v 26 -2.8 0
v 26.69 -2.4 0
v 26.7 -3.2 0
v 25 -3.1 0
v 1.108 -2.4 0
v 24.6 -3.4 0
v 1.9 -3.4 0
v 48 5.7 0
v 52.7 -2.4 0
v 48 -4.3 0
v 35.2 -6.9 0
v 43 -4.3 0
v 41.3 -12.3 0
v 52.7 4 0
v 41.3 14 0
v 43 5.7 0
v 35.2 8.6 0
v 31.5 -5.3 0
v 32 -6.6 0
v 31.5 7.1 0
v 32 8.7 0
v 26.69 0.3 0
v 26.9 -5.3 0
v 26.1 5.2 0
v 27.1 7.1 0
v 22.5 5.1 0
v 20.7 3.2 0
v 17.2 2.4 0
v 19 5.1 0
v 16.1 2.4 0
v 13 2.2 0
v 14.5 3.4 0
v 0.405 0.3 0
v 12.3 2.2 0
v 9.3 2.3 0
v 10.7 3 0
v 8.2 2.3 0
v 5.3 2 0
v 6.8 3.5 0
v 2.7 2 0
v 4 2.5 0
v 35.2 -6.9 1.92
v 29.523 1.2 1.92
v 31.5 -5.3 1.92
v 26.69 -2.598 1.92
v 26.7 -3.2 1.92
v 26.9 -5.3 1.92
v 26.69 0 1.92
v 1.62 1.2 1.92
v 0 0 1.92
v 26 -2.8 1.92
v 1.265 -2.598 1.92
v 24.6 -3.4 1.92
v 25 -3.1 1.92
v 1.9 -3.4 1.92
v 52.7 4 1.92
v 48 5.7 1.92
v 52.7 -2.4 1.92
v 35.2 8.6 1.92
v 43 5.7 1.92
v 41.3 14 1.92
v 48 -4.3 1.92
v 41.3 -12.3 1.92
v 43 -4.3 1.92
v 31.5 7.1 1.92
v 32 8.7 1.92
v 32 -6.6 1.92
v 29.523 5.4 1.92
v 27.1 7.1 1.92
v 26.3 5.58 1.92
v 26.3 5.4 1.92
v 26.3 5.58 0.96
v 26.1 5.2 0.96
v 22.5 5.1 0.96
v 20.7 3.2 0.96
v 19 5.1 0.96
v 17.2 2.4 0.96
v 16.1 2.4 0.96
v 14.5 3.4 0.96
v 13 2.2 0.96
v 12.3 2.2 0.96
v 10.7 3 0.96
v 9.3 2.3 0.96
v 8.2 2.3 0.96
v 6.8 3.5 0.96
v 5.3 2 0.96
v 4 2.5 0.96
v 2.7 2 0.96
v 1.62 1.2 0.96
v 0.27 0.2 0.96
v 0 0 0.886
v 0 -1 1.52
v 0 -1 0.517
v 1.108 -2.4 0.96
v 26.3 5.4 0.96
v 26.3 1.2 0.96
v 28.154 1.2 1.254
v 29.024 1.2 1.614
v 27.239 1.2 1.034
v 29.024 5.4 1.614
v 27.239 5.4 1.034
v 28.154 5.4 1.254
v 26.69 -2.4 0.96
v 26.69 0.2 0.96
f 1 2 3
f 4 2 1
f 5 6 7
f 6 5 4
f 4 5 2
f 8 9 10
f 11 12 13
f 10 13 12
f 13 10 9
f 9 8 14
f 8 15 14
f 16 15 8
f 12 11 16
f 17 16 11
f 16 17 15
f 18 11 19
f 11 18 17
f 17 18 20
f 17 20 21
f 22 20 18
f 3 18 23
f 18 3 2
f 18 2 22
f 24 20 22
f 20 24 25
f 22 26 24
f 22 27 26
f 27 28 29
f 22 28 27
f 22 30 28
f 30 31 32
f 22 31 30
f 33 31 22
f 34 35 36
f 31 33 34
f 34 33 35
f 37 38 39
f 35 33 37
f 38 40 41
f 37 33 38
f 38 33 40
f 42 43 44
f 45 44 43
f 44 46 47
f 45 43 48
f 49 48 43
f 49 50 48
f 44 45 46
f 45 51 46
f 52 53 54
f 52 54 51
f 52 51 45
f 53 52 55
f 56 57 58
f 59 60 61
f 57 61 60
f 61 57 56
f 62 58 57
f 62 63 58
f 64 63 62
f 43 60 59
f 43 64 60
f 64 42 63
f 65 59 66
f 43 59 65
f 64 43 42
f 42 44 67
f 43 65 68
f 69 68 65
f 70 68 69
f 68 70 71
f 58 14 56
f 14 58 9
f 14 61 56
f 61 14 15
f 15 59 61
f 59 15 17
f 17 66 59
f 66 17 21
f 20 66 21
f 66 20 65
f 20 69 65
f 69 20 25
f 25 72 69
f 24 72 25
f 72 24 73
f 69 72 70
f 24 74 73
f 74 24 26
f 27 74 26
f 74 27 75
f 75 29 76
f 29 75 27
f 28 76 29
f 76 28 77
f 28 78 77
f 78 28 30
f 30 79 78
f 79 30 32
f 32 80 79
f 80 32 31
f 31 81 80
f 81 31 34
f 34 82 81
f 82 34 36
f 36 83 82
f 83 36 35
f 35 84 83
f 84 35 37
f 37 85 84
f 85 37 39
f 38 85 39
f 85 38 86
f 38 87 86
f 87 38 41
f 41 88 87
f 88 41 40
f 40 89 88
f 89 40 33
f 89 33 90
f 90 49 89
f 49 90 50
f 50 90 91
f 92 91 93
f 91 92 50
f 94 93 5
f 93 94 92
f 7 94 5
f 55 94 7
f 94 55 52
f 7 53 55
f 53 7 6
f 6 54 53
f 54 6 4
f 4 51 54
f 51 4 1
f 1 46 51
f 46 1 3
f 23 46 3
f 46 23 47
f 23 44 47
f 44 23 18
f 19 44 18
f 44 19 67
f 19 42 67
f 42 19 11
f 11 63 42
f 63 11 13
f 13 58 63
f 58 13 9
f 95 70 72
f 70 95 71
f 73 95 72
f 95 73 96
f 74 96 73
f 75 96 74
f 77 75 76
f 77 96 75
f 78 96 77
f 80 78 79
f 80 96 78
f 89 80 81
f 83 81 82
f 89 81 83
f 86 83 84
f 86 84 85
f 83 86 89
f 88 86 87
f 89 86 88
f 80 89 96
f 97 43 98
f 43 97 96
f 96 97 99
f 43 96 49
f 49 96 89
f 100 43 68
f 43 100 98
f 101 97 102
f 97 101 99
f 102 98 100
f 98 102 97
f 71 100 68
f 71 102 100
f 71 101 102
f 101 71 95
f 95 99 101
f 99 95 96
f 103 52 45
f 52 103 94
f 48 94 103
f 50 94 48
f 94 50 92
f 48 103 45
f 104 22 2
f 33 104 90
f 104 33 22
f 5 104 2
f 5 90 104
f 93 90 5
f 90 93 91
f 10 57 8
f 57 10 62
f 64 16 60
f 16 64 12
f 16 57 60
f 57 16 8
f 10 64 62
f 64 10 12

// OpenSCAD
// A 3D printable house key.
// This has been changed to not reflect an actual key.

$fn = 40;

teeth_thickness = 0.96;
thickness = 1.92;
round_cut_size = 6;
groove_thickness = 0.96;

difference() {
    linear_extrude(thickness) scale([0.1, 0.1, 0.1]) polygon([
        // Teeth of key
        [0, 0],
        [27, 20],
        [40, 25],
        [53, 20],
        [68, 35],
        [82, 23],
        [93, 23],
        [107, 30],
        [123, 22],
        [130, 22],
        [145, 34],
        [161, 24],
        [172, 24],
        [190, 51],
        [207, 32],
        // End of teeth
        [225, 51],
        [261, 52],
        [271, 71],
        [315, 71],
        [320, 87],
        [352, 86],
        [413, 140],
        [527, 40],
        [527, -24],
        [413, -123],
        [352, -69],
        [320, -66],
        [315, -53],
        [269, -53],
        [267, -32],
        [260, -28],
        [250, -31],
        [246, -34],
        [19, -34],
        [0, -10],
    ]);
    
    // Depth cutout for jagged / teeth part
    translate([0, 1.2, teeth_thickness]) cube([26.3, 100, 1.0]);
    translate([26.3, 1.2, round_cut_size + teeth_thickness]) rotate([0, 90, 90]) cylinder(h=4.2, r=round_cut_size);
    
    // Groove on top
    translate([26.7-0.01, 0, 0]) rotate([90, 0, 0]) rotate([0, 90, 0]) translate([0, 0, -26.7]) linear_extrude(26.7) polygon([[0, thickness], [-(1.1+1.3)-0.2, thickness+0.01], [-(1.1+1.3), groove_thickness]]);
    
    // Groove on bottom
    translate([26.7-0.01, 0, 0]) rotate([90, 0, 0]) rotate([0, 90, 0]) translate([0, 0, -26.7]) linear_extrude(26.7) polygon([[0.3, 0], [-(1.1+1.3), 0], [0.2, thickness - groove_thickness]]);
    
    // Cutout on top
    translate([43, -4.3, 0]) cube([5, 10, 100]);
}
